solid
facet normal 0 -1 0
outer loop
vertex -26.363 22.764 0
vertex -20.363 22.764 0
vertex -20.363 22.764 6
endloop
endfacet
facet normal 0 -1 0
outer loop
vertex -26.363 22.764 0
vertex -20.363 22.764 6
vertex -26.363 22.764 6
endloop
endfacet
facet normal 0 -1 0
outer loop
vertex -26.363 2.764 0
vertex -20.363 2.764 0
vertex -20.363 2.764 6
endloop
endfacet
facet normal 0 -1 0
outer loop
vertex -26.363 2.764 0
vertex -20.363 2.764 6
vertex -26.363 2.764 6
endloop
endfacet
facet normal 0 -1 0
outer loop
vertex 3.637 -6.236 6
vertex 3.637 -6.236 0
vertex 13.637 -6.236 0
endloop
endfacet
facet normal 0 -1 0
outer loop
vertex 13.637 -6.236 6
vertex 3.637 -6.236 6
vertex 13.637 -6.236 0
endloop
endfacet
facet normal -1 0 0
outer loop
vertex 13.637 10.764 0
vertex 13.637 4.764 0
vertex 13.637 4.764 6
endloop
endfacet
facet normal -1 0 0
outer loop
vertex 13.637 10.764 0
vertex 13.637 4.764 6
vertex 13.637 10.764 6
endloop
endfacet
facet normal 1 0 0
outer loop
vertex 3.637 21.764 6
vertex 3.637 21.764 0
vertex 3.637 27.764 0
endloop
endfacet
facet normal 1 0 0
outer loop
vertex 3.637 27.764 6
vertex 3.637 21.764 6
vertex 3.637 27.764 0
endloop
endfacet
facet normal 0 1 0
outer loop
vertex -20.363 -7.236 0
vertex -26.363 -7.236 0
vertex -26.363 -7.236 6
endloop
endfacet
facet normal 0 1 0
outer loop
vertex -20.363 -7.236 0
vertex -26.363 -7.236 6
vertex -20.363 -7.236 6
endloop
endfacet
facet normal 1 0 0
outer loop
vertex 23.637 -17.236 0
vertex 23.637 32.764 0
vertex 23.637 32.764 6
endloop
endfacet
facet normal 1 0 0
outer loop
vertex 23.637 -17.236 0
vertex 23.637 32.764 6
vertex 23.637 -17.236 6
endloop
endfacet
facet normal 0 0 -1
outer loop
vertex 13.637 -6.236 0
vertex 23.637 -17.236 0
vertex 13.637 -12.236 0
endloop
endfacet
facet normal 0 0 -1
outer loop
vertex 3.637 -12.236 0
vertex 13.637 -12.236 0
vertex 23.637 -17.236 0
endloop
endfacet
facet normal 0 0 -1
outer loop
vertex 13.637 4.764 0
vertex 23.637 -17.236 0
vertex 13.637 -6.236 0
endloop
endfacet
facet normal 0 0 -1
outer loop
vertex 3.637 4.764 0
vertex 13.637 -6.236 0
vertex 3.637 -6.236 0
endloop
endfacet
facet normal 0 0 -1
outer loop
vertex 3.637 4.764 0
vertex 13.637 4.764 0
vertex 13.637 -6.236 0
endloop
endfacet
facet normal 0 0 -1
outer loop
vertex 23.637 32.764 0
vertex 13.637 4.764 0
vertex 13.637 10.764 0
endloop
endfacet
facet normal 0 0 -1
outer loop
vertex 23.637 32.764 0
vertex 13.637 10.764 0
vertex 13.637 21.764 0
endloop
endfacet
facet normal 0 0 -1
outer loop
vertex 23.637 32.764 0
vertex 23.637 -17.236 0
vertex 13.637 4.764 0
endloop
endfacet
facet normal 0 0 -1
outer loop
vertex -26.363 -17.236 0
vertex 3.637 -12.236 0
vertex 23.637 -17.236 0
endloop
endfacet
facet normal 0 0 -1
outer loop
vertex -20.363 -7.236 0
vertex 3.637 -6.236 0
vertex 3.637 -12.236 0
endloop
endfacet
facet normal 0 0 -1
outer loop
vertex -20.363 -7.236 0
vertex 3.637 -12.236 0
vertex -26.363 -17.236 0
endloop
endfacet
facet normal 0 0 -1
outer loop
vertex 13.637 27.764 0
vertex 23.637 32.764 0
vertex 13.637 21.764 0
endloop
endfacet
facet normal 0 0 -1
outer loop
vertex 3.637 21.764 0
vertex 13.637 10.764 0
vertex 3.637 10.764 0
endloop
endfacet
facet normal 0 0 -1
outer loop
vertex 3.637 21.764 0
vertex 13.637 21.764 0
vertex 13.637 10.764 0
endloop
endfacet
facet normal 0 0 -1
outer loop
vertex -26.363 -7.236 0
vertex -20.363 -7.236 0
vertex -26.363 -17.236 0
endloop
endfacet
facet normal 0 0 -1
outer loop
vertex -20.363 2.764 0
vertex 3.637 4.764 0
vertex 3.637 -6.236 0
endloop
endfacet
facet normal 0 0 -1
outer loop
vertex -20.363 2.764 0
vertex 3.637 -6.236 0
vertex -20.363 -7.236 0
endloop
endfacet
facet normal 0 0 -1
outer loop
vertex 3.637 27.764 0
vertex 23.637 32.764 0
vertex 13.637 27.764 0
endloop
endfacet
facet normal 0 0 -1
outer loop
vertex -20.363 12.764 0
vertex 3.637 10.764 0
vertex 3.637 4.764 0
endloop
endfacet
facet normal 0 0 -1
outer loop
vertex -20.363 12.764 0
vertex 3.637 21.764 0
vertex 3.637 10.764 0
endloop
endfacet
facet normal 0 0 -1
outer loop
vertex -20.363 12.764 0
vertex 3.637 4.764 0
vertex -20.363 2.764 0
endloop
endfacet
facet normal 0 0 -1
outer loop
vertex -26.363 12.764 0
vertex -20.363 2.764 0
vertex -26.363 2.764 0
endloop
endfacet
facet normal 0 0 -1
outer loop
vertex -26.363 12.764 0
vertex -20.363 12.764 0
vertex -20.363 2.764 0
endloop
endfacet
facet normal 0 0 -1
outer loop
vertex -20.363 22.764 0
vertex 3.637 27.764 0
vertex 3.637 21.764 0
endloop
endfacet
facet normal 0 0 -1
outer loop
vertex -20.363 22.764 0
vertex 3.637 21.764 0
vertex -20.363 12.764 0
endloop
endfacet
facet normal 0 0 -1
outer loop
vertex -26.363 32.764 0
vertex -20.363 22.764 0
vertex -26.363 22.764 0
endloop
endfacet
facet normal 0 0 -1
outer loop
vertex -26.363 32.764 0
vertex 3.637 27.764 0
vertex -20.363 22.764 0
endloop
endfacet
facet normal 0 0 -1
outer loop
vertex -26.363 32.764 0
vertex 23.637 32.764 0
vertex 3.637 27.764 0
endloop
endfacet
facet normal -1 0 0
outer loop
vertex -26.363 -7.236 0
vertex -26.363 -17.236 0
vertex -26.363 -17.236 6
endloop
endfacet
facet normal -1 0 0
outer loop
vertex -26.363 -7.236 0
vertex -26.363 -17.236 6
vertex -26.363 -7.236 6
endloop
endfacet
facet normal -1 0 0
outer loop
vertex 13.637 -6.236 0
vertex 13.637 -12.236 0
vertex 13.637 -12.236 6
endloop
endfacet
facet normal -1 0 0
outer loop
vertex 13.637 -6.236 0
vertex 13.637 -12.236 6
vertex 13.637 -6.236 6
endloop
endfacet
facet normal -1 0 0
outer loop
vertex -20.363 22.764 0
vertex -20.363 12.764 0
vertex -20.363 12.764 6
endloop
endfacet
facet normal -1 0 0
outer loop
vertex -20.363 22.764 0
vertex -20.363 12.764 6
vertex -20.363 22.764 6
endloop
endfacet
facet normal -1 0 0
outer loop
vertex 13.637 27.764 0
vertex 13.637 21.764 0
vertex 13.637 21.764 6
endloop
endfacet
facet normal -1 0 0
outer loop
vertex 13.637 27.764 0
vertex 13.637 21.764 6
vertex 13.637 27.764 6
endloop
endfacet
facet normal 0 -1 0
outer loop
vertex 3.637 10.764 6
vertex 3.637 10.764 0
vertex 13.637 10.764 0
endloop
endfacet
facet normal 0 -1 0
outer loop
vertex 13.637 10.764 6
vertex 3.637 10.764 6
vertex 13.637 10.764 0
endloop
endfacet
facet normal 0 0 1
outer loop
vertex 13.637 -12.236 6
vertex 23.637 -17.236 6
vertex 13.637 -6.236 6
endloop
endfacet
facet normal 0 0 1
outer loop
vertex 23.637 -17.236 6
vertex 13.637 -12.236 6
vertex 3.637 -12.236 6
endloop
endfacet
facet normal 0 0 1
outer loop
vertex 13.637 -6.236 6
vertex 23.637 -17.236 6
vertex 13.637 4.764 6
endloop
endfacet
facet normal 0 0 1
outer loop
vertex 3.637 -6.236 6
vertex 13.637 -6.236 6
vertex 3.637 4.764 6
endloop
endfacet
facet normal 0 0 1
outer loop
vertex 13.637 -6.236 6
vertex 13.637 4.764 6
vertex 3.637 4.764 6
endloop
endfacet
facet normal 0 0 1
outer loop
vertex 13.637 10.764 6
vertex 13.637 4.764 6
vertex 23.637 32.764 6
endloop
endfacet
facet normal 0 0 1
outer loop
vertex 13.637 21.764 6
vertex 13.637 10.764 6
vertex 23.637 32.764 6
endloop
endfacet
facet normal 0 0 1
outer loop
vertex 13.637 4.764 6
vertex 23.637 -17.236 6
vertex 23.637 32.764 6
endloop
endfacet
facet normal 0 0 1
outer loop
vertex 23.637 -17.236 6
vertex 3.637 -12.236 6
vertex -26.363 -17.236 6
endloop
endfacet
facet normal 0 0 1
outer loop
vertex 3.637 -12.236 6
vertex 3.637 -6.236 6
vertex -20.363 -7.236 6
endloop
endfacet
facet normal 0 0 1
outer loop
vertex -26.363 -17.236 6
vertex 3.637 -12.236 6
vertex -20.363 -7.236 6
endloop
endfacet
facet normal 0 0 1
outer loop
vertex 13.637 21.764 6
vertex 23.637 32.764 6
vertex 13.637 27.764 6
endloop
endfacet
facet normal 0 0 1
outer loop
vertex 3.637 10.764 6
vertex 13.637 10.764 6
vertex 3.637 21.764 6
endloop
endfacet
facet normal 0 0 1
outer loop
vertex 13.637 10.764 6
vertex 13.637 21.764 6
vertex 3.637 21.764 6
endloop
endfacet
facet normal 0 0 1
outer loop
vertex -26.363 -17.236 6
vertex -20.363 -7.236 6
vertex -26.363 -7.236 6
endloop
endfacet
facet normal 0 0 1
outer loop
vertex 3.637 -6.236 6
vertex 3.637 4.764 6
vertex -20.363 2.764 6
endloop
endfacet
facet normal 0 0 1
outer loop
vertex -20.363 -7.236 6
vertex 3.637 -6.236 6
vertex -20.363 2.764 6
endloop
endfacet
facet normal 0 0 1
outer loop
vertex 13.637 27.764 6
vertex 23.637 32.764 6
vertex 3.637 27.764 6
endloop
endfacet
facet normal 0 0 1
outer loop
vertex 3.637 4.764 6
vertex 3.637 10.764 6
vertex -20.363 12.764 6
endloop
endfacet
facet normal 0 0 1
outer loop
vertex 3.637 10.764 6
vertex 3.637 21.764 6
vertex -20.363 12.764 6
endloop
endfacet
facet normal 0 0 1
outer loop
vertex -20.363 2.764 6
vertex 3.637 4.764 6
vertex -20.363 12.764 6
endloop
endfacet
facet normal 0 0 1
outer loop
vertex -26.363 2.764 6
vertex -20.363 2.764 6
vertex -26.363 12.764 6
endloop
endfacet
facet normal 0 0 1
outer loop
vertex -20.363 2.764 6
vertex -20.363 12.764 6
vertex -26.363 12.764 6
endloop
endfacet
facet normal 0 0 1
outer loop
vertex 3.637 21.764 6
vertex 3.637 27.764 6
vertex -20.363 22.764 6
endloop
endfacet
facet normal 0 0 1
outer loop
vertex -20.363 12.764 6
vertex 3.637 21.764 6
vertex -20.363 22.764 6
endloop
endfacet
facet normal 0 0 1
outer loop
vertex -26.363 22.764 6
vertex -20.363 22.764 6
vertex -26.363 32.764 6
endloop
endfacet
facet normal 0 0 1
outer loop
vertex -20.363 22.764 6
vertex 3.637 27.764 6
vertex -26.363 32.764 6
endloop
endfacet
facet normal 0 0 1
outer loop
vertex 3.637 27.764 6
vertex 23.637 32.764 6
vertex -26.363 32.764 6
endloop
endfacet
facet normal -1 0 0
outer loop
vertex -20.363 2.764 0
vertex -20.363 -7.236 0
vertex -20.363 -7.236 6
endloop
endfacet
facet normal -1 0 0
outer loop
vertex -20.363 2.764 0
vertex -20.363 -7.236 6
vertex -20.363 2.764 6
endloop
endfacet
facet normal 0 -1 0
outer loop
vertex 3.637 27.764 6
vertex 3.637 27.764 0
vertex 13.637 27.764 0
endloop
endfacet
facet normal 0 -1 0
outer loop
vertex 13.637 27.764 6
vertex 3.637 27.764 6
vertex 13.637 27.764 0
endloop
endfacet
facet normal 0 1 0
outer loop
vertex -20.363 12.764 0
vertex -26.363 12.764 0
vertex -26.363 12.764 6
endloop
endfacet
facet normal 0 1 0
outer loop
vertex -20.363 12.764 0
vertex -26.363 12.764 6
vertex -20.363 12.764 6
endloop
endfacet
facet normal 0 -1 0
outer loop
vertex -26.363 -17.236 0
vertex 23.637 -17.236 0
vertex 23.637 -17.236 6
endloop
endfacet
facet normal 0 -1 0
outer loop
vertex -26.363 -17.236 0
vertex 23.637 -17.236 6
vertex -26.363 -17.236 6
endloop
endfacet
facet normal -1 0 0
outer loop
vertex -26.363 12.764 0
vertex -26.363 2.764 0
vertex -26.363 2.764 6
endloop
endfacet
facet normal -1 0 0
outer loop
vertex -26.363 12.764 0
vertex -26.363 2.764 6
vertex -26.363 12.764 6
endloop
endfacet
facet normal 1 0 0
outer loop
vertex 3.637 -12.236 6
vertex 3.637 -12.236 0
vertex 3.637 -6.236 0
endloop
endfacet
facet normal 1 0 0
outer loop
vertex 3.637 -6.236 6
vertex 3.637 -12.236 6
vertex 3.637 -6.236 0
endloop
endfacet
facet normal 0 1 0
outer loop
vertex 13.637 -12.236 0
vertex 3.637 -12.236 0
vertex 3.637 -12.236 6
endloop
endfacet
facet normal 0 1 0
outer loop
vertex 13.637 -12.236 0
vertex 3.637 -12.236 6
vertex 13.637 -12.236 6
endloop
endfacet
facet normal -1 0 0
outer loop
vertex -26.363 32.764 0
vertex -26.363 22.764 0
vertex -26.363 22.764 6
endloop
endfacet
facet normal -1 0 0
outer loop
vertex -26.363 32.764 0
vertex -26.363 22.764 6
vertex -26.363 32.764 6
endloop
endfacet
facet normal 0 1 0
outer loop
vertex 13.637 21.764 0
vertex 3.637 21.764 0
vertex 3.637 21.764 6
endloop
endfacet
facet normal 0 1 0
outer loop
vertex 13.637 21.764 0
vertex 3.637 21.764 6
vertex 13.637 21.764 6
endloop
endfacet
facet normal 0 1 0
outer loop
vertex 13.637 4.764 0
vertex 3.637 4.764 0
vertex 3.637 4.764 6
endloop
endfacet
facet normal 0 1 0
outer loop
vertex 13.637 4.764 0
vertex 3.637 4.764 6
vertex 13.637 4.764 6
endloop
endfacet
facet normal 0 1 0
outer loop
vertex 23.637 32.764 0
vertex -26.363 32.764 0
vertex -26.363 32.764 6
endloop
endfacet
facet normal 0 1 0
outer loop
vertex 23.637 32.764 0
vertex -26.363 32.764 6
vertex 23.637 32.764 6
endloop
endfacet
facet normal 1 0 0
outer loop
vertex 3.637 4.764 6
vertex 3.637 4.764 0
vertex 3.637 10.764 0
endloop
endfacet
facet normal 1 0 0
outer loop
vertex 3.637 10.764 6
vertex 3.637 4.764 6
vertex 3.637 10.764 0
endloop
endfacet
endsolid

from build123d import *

# Parameters (mm, degrees)
SKETCH_1_W      = 10
SKETCH_1_H      = 6
EXTRUDE_1_DEPTH = 6


with BuildPart() as part:
    # 草圖1 → 填料-伸長1 (new body)
    with BuildSketch(Plane.XY):
        Polygon((-26.362898543, 32.763671875), (23.637101457, 32.763671875), (23.637101457, -17.236328125), (-26.362898543, -17.236328125), (-26.362898543, -7.236328125), (-20.362898543, -7.236328125), (-20.362898543, 2.763671875), (-26.362898543, 2.763671875), (-26.362898543, 12.763671875), (-20.362898543, 12.763671875), (-20.362898543, 22.763671875), (-26.362898543, 22.763671875), align=None)
        with Locations((8.637101457, 7.763671875)):
            Rectangle(SKETCH_1_W, SKETCH_1_H, mode=Mode.SUBTRACT)
        with Locations((8.637101457, 24.763671875)):
            Rectangle(SKETCH_1_W, SKETCH_1_H, mode=Mode.SUBTRACT)
        with Locations((8.637101457, -9.236328125)):
            Rectangle(SKETCH_1_W, SKETCH_1_H, mode=Mode.SUBTRACT)
    extrude(amount=EXTRUDE_1_DEPTH)


solid = part.part
